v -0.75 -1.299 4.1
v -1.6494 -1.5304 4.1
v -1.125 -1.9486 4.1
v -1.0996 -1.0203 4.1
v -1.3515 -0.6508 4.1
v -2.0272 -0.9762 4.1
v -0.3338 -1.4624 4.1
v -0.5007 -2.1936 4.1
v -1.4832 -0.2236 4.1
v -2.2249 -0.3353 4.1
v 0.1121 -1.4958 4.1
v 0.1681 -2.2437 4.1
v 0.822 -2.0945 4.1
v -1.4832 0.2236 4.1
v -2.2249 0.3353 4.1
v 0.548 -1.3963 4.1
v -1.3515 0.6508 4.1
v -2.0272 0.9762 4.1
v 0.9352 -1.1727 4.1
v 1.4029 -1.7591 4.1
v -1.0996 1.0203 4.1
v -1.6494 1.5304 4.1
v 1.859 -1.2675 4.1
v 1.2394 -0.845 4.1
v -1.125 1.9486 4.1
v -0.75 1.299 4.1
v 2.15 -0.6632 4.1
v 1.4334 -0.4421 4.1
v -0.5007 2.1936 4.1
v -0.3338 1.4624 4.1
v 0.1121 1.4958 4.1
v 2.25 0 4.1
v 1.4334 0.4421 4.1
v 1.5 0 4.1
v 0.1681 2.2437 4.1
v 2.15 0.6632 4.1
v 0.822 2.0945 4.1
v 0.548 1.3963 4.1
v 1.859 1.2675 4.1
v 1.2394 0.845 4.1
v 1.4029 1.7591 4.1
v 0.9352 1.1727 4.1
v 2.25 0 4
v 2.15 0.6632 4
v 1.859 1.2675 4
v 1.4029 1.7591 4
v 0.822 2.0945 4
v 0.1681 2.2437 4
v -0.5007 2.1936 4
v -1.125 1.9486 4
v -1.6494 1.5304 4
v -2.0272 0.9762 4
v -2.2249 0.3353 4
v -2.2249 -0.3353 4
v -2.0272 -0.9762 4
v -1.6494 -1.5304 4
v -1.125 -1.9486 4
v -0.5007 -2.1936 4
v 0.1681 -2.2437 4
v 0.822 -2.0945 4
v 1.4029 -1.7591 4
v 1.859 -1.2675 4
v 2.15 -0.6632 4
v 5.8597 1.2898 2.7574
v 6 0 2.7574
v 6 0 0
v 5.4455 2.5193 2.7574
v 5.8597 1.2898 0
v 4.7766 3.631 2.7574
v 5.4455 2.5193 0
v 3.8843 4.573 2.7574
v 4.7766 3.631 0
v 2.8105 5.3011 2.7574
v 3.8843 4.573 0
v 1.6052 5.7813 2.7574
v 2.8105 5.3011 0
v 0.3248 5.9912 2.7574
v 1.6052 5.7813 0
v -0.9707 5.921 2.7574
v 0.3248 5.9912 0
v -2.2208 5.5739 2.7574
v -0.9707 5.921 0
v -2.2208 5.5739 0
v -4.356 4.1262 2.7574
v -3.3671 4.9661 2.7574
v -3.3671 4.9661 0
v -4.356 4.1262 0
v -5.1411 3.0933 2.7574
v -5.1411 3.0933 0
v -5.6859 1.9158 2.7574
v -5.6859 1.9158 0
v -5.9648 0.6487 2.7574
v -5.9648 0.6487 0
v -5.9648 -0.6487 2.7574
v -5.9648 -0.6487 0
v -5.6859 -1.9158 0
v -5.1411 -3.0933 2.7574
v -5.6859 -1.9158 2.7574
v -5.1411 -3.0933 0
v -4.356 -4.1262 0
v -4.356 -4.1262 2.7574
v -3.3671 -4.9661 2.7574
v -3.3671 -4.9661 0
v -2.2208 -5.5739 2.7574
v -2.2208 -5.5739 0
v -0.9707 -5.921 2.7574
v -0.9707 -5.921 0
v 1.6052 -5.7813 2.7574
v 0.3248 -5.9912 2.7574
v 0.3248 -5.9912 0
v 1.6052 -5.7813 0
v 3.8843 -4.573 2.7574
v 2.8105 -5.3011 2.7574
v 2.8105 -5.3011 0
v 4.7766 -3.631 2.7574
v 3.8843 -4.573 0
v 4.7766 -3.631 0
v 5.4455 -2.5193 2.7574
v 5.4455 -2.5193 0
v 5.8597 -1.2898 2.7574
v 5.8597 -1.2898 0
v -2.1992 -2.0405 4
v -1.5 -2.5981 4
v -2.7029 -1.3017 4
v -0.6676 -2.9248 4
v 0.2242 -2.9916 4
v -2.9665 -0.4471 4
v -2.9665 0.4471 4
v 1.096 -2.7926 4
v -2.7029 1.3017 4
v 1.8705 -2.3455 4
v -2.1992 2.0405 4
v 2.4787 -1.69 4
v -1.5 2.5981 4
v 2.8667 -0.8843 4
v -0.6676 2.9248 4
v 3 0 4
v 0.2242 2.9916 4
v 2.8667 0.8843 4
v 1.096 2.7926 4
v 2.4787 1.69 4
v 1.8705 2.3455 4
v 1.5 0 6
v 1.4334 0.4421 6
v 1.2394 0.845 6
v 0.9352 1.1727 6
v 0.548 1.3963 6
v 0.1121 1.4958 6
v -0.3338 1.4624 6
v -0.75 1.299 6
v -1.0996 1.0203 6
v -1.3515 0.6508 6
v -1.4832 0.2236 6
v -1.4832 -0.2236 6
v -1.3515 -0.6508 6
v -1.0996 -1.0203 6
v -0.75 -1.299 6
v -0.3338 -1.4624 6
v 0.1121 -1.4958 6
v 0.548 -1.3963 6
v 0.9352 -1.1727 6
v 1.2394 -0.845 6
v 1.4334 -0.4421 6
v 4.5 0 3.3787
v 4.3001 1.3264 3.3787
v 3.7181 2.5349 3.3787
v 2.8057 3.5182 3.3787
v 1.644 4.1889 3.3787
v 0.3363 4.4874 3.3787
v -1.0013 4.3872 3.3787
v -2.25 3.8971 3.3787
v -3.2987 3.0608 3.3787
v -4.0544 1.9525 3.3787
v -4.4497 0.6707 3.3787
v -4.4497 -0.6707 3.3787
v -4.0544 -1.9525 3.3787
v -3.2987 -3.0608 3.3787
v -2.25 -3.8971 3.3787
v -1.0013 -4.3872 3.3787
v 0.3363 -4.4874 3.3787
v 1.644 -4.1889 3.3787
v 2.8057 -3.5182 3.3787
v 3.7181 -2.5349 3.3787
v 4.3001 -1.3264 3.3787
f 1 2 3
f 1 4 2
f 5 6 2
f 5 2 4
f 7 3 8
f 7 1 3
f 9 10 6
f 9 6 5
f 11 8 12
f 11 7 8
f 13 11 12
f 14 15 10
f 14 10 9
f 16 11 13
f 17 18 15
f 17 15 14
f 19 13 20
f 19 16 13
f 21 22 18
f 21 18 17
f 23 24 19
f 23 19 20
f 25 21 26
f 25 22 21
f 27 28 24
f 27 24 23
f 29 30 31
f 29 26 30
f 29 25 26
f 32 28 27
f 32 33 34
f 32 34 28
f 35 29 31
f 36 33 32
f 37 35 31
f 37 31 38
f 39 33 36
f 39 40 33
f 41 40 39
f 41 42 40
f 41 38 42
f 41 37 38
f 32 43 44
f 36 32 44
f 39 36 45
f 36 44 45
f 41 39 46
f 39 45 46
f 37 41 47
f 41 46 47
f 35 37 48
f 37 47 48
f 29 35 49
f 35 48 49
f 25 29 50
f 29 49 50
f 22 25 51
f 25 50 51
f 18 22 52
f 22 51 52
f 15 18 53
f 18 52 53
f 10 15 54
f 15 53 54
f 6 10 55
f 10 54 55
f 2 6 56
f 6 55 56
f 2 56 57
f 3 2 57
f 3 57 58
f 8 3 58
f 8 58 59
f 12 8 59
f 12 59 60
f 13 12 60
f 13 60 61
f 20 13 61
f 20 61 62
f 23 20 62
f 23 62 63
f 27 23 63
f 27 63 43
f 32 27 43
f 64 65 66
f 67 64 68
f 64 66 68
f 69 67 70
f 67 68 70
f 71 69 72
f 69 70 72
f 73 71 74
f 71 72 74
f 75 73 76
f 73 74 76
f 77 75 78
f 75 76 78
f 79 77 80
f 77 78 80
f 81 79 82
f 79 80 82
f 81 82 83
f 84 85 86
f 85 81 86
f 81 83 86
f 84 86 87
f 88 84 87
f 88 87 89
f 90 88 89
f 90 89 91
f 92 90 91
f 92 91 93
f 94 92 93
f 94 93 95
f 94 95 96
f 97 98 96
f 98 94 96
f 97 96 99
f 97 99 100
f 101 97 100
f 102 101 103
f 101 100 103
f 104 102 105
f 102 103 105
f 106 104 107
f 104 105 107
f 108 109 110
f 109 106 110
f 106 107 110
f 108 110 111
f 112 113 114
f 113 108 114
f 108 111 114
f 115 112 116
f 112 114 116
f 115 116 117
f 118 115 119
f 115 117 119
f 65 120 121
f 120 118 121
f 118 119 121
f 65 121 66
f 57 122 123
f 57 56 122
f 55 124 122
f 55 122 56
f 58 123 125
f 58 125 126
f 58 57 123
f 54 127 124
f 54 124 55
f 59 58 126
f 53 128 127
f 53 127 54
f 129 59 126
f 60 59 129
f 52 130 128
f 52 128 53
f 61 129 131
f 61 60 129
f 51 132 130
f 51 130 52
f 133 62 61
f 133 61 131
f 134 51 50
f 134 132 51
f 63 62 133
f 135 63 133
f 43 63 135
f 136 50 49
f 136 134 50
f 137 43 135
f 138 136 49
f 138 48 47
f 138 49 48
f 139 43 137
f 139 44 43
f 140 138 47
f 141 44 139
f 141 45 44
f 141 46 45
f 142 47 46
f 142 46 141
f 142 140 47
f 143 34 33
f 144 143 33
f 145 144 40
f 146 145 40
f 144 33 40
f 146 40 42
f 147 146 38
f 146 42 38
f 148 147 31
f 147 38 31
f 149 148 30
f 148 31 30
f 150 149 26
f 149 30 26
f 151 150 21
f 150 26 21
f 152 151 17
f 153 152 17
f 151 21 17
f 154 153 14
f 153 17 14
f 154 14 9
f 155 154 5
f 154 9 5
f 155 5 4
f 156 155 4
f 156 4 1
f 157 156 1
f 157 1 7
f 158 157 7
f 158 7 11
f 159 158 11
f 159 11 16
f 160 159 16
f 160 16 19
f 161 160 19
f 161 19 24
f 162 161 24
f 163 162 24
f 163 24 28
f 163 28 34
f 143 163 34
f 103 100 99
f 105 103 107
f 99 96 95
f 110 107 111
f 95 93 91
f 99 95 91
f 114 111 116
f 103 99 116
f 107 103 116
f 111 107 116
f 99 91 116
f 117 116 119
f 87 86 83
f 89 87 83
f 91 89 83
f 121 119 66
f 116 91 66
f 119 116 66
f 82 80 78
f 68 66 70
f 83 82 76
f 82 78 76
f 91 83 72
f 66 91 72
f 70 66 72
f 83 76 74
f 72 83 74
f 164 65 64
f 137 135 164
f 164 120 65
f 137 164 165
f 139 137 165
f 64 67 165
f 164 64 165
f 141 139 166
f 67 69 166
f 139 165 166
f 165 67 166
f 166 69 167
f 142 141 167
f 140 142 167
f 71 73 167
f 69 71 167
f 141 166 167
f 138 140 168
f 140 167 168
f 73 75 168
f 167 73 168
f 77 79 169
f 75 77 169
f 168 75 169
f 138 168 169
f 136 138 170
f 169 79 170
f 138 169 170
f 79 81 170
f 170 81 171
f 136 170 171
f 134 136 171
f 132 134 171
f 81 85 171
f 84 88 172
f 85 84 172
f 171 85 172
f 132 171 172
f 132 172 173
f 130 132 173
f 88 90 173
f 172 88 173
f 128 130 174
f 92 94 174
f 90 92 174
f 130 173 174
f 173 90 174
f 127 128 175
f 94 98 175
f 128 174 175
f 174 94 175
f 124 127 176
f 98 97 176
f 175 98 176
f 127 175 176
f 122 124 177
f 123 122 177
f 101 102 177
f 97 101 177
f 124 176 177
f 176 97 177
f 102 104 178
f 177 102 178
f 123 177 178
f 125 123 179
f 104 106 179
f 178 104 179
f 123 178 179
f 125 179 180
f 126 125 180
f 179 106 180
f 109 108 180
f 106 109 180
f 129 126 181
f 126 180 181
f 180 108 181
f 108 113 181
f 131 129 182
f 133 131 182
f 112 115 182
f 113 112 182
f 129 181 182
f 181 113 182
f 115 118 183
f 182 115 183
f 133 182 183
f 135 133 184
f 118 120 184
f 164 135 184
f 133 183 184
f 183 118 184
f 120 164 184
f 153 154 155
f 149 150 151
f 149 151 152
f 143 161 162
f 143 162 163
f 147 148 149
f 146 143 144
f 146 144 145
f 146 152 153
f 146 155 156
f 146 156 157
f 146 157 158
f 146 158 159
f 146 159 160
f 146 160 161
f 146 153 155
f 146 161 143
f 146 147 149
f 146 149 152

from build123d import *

# Parameters (mm, degrees)
F0_R     = 1.5
F1_DEPTH = 6
F0_R_2   = 2.25
F2_DEPTH = 4.1
F0_R_3   = 6
F3_DEPTH = 4
F4_SIZE  = 1


# Not quite as in the source:
# - a fillet or chamfer that OpenCascade refuses, or shapes differently, is made with other operations: its cross-section is extruded or revolved along the edge and cut away or added


with BuildPart() as f1:
    # F0 (on Top) → F1 (new body)
    with BuildSketch(Plane.XY):
        Circle(F0_R)
    extrude(amount=F1_DEPTH)

    # F0 (on Top) → F2 (join)
    with BuildSketch(Plane.XY):
        Circle(F0_R_2)
        Circle(F0_R, mode=Mode.SUBTRACT)
    extrude(amount=F2_DEPTH)

    # F0 (on Top) → F3 (join)
    with BuildSketch(Plane.XY):
        Circle(F0_R_3)
        Circle(F0_R_2, mode=Mode.SUBTRACT)
    extrude(amount=F3_DEPTH)

    # F4
    f4_edges = [f1.edges().sort_by_distance(p)[0] for p in [
        (-6, 0, 4),
    ]]
    chamfer(f4_edges, length=F4_SIZE)

    # F5: chamfer of 2 on 1 edges, made by hand

    # F5_s1 → F5_t2 (revolve, cut)
    with BuildSketch(Plane.XZ):
        Polygon((3, 4), (6.4142135624, 2.5857864376), (5, 4), align=None)
    revolve(axis=Axis((0, 0, 4), (0, 0, 1)), mode=Mode.SUBTRACT)


solid = f1.part
